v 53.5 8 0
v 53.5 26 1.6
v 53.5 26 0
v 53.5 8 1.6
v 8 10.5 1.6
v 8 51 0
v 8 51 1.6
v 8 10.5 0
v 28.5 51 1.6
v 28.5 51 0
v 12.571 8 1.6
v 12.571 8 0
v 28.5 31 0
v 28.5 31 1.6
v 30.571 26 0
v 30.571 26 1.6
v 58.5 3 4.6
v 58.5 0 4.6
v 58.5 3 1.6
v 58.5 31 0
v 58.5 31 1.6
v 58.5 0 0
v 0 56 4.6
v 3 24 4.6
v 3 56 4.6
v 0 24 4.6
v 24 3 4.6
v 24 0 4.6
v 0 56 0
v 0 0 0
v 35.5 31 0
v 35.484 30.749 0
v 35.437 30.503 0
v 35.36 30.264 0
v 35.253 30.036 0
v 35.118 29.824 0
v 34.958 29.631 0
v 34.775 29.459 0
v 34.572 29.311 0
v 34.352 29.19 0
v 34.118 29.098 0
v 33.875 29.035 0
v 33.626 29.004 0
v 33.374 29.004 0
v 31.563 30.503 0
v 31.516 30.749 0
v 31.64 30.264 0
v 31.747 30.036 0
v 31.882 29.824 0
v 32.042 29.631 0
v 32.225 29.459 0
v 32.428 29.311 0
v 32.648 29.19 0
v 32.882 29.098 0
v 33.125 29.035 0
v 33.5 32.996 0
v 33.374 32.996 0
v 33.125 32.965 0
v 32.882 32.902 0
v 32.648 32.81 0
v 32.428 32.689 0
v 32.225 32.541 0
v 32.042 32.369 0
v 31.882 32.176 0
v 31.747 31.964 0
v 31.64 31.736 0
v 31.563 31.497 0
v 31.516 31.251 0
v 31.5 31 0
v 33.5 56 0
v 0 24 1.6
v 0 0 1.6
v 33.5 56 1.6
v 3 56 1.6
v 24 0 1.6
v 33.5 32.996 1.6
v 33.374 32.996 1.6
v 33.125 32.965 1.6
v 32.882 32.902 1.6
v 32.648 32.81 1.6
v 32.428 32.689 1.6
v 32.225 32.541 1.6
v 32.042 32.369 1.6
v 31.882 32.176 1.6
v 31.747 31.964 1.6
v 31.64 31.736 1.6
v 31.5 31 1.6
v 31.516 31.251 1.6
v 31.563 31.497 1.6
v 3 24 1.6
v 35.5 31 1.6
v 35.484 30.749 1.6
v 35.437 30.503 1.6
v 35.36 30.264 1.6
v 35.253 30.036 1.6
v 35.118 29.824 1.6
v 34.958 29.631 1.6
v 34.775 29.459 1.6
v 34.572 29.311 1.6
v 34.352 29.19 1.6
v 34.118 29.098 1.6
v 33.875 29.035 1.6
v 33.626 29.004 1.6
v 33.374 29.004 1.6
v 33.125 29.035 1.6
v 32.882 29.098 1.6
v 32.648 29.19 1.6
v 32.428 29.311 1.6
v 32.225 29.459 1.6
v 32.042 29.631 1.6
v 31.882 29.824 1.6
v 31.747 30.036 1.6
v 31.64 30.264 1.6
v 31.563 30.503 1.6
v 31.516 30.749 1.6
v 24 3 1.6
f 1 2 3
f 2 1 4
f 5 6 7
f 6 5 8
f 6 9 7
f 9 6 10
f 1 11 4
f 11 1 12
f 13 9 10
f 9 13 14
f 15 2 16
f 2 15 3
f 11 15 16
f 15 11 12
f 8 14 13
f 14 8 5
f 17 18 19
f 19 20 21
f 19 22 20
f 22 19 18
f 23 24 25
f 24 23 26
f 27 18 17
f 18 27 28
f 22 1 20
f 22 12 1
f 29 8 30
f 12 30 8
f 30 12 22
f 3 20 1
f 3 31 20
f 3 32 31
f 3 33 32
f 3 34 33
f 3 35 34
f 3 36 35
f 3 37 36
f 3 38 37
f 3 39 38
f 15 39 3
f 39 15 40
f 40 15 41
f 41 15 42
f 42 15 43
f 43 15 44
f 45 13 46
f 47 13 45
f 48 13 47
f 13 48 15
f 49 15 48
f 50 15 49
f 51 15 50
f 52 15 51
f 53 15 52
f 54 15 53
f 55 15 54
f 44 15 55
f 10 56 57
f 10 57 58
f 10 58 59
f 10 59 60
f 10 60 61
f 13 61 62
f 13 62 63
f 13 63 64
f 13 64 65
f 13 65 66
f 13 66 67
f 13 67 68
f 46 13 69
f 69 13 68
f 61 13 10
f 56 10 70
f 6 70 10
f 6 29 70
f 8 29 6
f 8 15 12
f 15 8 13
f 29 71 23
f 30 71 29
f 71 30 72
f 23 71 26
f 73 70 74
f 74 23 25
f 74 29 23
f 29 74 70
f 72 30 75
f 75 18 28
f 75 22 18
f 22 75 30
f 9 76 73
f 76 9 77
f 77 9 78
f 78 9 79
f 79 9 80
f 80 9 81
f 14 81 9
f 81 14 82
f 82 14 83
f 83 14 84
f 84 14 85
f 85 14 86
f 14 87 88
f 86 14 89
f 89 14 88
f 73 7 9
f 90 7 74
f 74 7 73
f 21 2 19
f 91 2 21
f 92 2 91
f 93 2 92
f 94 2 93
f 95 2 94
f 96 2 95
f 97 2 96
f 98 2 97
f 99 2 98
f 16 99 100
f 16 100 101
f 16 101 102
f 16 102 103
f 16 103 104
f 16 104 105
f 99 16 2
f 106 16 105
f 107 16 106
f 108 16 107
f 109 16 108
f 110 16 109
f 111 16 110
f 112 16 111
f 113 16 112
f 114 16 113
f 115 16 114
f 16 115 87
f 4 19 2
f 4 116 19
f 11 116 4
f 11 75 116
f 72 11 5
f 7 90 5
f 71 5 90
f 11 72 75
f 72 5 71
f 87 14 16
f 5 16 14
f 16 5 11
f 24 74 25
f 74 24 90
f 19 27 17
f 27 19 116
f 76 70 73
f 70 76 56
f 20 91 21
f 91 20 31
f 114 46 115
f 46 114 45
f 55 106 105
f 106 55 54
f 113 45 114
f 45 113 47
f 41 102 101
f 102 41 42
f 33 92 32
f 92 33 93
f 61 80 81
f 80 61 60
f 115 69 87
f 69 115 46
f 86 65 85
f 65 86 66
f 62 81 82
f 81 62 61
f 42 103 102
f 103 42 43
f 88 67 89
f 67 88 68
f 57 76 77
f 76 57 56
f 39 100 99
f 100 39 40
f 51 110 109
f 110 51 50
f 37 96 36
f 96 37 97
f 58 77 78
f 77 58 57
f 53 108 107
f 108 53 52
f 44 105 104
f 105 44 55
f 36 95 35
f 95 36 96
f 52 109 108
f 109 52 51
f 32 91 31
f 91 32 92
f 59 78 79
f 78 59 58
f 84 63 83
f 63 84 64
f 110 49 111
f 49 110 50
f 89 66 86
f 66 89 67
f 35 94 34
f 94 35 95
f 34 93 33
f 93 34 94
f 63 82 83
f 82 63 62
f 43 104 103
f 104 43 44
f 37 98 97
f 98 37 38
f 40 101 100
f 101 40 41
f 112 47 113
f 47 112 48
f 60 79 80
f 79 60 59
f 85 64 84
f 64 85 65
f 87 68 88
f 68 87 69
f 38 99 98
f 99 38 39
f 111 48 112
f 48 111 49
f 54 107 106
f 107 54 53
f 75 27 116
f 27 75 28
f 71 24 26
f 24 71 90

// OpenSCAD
/* [General] */
// Offset from one side
sideLeft = 30.5;
// Offset from the other side
sideRight = 28;

/* [Fine tuning] */
// Thickness of the bottom piece
bottomThickness = 3;
// Thickness of the angle pieces
topThickness = 1.6;
// Wall thickness
wall = 3;
// Margin cutout to align item
margin = 25;
// Corner cutout
radius = 2;
// Margin for inner cutout
cutoutMargin = 5;

/* [Hidden] */
$fn = 50;
thickness = bottomThickness + topThickness;

difference() {
  cube([sideLeft + margin + wall, sideRight + margin + wall, thickness]);
  
  translate([wall, wall, topThickness])
    cube([sideLeft + margin + wall, sideRight + margin + wall, thickness]);
  
  translate([sideLeft + wall, sideRight + wall, - 1])
    cube([sideLeft + margin + wall, sideRight + margin + wall, thickness + 2]);
  
  translate([sideLeft + wall, sideRight + wall, - 1])
    cylinder(r = radius, h = thickness + 2);
  
  translate([-1, -1, topThickness])
    cube([margin, margin, thickness]);
  
  difference() {
    translate([wall + cutoutMargin, wall + cutoutMargin, - 1])
      cube([sideLeft + margin - cutoutMargin * 2, sideRight + margin - cutoutMargin * 2, thickness + 2]);
  
    translate([sideLeft + wall - cutoutMargin, sideRight + wall - cutoutMargin, - 1])
      cube([sideLeft + margin + wall, sideRight + margin + wall, thickness + 2]);
   
    translate([-cutoutMargin / 2, 0, -1])
      rotate([0, 0, -45])
        cube([cutoutMargin, sideRight + margin + wall, thickness + 2]);
  }
}
